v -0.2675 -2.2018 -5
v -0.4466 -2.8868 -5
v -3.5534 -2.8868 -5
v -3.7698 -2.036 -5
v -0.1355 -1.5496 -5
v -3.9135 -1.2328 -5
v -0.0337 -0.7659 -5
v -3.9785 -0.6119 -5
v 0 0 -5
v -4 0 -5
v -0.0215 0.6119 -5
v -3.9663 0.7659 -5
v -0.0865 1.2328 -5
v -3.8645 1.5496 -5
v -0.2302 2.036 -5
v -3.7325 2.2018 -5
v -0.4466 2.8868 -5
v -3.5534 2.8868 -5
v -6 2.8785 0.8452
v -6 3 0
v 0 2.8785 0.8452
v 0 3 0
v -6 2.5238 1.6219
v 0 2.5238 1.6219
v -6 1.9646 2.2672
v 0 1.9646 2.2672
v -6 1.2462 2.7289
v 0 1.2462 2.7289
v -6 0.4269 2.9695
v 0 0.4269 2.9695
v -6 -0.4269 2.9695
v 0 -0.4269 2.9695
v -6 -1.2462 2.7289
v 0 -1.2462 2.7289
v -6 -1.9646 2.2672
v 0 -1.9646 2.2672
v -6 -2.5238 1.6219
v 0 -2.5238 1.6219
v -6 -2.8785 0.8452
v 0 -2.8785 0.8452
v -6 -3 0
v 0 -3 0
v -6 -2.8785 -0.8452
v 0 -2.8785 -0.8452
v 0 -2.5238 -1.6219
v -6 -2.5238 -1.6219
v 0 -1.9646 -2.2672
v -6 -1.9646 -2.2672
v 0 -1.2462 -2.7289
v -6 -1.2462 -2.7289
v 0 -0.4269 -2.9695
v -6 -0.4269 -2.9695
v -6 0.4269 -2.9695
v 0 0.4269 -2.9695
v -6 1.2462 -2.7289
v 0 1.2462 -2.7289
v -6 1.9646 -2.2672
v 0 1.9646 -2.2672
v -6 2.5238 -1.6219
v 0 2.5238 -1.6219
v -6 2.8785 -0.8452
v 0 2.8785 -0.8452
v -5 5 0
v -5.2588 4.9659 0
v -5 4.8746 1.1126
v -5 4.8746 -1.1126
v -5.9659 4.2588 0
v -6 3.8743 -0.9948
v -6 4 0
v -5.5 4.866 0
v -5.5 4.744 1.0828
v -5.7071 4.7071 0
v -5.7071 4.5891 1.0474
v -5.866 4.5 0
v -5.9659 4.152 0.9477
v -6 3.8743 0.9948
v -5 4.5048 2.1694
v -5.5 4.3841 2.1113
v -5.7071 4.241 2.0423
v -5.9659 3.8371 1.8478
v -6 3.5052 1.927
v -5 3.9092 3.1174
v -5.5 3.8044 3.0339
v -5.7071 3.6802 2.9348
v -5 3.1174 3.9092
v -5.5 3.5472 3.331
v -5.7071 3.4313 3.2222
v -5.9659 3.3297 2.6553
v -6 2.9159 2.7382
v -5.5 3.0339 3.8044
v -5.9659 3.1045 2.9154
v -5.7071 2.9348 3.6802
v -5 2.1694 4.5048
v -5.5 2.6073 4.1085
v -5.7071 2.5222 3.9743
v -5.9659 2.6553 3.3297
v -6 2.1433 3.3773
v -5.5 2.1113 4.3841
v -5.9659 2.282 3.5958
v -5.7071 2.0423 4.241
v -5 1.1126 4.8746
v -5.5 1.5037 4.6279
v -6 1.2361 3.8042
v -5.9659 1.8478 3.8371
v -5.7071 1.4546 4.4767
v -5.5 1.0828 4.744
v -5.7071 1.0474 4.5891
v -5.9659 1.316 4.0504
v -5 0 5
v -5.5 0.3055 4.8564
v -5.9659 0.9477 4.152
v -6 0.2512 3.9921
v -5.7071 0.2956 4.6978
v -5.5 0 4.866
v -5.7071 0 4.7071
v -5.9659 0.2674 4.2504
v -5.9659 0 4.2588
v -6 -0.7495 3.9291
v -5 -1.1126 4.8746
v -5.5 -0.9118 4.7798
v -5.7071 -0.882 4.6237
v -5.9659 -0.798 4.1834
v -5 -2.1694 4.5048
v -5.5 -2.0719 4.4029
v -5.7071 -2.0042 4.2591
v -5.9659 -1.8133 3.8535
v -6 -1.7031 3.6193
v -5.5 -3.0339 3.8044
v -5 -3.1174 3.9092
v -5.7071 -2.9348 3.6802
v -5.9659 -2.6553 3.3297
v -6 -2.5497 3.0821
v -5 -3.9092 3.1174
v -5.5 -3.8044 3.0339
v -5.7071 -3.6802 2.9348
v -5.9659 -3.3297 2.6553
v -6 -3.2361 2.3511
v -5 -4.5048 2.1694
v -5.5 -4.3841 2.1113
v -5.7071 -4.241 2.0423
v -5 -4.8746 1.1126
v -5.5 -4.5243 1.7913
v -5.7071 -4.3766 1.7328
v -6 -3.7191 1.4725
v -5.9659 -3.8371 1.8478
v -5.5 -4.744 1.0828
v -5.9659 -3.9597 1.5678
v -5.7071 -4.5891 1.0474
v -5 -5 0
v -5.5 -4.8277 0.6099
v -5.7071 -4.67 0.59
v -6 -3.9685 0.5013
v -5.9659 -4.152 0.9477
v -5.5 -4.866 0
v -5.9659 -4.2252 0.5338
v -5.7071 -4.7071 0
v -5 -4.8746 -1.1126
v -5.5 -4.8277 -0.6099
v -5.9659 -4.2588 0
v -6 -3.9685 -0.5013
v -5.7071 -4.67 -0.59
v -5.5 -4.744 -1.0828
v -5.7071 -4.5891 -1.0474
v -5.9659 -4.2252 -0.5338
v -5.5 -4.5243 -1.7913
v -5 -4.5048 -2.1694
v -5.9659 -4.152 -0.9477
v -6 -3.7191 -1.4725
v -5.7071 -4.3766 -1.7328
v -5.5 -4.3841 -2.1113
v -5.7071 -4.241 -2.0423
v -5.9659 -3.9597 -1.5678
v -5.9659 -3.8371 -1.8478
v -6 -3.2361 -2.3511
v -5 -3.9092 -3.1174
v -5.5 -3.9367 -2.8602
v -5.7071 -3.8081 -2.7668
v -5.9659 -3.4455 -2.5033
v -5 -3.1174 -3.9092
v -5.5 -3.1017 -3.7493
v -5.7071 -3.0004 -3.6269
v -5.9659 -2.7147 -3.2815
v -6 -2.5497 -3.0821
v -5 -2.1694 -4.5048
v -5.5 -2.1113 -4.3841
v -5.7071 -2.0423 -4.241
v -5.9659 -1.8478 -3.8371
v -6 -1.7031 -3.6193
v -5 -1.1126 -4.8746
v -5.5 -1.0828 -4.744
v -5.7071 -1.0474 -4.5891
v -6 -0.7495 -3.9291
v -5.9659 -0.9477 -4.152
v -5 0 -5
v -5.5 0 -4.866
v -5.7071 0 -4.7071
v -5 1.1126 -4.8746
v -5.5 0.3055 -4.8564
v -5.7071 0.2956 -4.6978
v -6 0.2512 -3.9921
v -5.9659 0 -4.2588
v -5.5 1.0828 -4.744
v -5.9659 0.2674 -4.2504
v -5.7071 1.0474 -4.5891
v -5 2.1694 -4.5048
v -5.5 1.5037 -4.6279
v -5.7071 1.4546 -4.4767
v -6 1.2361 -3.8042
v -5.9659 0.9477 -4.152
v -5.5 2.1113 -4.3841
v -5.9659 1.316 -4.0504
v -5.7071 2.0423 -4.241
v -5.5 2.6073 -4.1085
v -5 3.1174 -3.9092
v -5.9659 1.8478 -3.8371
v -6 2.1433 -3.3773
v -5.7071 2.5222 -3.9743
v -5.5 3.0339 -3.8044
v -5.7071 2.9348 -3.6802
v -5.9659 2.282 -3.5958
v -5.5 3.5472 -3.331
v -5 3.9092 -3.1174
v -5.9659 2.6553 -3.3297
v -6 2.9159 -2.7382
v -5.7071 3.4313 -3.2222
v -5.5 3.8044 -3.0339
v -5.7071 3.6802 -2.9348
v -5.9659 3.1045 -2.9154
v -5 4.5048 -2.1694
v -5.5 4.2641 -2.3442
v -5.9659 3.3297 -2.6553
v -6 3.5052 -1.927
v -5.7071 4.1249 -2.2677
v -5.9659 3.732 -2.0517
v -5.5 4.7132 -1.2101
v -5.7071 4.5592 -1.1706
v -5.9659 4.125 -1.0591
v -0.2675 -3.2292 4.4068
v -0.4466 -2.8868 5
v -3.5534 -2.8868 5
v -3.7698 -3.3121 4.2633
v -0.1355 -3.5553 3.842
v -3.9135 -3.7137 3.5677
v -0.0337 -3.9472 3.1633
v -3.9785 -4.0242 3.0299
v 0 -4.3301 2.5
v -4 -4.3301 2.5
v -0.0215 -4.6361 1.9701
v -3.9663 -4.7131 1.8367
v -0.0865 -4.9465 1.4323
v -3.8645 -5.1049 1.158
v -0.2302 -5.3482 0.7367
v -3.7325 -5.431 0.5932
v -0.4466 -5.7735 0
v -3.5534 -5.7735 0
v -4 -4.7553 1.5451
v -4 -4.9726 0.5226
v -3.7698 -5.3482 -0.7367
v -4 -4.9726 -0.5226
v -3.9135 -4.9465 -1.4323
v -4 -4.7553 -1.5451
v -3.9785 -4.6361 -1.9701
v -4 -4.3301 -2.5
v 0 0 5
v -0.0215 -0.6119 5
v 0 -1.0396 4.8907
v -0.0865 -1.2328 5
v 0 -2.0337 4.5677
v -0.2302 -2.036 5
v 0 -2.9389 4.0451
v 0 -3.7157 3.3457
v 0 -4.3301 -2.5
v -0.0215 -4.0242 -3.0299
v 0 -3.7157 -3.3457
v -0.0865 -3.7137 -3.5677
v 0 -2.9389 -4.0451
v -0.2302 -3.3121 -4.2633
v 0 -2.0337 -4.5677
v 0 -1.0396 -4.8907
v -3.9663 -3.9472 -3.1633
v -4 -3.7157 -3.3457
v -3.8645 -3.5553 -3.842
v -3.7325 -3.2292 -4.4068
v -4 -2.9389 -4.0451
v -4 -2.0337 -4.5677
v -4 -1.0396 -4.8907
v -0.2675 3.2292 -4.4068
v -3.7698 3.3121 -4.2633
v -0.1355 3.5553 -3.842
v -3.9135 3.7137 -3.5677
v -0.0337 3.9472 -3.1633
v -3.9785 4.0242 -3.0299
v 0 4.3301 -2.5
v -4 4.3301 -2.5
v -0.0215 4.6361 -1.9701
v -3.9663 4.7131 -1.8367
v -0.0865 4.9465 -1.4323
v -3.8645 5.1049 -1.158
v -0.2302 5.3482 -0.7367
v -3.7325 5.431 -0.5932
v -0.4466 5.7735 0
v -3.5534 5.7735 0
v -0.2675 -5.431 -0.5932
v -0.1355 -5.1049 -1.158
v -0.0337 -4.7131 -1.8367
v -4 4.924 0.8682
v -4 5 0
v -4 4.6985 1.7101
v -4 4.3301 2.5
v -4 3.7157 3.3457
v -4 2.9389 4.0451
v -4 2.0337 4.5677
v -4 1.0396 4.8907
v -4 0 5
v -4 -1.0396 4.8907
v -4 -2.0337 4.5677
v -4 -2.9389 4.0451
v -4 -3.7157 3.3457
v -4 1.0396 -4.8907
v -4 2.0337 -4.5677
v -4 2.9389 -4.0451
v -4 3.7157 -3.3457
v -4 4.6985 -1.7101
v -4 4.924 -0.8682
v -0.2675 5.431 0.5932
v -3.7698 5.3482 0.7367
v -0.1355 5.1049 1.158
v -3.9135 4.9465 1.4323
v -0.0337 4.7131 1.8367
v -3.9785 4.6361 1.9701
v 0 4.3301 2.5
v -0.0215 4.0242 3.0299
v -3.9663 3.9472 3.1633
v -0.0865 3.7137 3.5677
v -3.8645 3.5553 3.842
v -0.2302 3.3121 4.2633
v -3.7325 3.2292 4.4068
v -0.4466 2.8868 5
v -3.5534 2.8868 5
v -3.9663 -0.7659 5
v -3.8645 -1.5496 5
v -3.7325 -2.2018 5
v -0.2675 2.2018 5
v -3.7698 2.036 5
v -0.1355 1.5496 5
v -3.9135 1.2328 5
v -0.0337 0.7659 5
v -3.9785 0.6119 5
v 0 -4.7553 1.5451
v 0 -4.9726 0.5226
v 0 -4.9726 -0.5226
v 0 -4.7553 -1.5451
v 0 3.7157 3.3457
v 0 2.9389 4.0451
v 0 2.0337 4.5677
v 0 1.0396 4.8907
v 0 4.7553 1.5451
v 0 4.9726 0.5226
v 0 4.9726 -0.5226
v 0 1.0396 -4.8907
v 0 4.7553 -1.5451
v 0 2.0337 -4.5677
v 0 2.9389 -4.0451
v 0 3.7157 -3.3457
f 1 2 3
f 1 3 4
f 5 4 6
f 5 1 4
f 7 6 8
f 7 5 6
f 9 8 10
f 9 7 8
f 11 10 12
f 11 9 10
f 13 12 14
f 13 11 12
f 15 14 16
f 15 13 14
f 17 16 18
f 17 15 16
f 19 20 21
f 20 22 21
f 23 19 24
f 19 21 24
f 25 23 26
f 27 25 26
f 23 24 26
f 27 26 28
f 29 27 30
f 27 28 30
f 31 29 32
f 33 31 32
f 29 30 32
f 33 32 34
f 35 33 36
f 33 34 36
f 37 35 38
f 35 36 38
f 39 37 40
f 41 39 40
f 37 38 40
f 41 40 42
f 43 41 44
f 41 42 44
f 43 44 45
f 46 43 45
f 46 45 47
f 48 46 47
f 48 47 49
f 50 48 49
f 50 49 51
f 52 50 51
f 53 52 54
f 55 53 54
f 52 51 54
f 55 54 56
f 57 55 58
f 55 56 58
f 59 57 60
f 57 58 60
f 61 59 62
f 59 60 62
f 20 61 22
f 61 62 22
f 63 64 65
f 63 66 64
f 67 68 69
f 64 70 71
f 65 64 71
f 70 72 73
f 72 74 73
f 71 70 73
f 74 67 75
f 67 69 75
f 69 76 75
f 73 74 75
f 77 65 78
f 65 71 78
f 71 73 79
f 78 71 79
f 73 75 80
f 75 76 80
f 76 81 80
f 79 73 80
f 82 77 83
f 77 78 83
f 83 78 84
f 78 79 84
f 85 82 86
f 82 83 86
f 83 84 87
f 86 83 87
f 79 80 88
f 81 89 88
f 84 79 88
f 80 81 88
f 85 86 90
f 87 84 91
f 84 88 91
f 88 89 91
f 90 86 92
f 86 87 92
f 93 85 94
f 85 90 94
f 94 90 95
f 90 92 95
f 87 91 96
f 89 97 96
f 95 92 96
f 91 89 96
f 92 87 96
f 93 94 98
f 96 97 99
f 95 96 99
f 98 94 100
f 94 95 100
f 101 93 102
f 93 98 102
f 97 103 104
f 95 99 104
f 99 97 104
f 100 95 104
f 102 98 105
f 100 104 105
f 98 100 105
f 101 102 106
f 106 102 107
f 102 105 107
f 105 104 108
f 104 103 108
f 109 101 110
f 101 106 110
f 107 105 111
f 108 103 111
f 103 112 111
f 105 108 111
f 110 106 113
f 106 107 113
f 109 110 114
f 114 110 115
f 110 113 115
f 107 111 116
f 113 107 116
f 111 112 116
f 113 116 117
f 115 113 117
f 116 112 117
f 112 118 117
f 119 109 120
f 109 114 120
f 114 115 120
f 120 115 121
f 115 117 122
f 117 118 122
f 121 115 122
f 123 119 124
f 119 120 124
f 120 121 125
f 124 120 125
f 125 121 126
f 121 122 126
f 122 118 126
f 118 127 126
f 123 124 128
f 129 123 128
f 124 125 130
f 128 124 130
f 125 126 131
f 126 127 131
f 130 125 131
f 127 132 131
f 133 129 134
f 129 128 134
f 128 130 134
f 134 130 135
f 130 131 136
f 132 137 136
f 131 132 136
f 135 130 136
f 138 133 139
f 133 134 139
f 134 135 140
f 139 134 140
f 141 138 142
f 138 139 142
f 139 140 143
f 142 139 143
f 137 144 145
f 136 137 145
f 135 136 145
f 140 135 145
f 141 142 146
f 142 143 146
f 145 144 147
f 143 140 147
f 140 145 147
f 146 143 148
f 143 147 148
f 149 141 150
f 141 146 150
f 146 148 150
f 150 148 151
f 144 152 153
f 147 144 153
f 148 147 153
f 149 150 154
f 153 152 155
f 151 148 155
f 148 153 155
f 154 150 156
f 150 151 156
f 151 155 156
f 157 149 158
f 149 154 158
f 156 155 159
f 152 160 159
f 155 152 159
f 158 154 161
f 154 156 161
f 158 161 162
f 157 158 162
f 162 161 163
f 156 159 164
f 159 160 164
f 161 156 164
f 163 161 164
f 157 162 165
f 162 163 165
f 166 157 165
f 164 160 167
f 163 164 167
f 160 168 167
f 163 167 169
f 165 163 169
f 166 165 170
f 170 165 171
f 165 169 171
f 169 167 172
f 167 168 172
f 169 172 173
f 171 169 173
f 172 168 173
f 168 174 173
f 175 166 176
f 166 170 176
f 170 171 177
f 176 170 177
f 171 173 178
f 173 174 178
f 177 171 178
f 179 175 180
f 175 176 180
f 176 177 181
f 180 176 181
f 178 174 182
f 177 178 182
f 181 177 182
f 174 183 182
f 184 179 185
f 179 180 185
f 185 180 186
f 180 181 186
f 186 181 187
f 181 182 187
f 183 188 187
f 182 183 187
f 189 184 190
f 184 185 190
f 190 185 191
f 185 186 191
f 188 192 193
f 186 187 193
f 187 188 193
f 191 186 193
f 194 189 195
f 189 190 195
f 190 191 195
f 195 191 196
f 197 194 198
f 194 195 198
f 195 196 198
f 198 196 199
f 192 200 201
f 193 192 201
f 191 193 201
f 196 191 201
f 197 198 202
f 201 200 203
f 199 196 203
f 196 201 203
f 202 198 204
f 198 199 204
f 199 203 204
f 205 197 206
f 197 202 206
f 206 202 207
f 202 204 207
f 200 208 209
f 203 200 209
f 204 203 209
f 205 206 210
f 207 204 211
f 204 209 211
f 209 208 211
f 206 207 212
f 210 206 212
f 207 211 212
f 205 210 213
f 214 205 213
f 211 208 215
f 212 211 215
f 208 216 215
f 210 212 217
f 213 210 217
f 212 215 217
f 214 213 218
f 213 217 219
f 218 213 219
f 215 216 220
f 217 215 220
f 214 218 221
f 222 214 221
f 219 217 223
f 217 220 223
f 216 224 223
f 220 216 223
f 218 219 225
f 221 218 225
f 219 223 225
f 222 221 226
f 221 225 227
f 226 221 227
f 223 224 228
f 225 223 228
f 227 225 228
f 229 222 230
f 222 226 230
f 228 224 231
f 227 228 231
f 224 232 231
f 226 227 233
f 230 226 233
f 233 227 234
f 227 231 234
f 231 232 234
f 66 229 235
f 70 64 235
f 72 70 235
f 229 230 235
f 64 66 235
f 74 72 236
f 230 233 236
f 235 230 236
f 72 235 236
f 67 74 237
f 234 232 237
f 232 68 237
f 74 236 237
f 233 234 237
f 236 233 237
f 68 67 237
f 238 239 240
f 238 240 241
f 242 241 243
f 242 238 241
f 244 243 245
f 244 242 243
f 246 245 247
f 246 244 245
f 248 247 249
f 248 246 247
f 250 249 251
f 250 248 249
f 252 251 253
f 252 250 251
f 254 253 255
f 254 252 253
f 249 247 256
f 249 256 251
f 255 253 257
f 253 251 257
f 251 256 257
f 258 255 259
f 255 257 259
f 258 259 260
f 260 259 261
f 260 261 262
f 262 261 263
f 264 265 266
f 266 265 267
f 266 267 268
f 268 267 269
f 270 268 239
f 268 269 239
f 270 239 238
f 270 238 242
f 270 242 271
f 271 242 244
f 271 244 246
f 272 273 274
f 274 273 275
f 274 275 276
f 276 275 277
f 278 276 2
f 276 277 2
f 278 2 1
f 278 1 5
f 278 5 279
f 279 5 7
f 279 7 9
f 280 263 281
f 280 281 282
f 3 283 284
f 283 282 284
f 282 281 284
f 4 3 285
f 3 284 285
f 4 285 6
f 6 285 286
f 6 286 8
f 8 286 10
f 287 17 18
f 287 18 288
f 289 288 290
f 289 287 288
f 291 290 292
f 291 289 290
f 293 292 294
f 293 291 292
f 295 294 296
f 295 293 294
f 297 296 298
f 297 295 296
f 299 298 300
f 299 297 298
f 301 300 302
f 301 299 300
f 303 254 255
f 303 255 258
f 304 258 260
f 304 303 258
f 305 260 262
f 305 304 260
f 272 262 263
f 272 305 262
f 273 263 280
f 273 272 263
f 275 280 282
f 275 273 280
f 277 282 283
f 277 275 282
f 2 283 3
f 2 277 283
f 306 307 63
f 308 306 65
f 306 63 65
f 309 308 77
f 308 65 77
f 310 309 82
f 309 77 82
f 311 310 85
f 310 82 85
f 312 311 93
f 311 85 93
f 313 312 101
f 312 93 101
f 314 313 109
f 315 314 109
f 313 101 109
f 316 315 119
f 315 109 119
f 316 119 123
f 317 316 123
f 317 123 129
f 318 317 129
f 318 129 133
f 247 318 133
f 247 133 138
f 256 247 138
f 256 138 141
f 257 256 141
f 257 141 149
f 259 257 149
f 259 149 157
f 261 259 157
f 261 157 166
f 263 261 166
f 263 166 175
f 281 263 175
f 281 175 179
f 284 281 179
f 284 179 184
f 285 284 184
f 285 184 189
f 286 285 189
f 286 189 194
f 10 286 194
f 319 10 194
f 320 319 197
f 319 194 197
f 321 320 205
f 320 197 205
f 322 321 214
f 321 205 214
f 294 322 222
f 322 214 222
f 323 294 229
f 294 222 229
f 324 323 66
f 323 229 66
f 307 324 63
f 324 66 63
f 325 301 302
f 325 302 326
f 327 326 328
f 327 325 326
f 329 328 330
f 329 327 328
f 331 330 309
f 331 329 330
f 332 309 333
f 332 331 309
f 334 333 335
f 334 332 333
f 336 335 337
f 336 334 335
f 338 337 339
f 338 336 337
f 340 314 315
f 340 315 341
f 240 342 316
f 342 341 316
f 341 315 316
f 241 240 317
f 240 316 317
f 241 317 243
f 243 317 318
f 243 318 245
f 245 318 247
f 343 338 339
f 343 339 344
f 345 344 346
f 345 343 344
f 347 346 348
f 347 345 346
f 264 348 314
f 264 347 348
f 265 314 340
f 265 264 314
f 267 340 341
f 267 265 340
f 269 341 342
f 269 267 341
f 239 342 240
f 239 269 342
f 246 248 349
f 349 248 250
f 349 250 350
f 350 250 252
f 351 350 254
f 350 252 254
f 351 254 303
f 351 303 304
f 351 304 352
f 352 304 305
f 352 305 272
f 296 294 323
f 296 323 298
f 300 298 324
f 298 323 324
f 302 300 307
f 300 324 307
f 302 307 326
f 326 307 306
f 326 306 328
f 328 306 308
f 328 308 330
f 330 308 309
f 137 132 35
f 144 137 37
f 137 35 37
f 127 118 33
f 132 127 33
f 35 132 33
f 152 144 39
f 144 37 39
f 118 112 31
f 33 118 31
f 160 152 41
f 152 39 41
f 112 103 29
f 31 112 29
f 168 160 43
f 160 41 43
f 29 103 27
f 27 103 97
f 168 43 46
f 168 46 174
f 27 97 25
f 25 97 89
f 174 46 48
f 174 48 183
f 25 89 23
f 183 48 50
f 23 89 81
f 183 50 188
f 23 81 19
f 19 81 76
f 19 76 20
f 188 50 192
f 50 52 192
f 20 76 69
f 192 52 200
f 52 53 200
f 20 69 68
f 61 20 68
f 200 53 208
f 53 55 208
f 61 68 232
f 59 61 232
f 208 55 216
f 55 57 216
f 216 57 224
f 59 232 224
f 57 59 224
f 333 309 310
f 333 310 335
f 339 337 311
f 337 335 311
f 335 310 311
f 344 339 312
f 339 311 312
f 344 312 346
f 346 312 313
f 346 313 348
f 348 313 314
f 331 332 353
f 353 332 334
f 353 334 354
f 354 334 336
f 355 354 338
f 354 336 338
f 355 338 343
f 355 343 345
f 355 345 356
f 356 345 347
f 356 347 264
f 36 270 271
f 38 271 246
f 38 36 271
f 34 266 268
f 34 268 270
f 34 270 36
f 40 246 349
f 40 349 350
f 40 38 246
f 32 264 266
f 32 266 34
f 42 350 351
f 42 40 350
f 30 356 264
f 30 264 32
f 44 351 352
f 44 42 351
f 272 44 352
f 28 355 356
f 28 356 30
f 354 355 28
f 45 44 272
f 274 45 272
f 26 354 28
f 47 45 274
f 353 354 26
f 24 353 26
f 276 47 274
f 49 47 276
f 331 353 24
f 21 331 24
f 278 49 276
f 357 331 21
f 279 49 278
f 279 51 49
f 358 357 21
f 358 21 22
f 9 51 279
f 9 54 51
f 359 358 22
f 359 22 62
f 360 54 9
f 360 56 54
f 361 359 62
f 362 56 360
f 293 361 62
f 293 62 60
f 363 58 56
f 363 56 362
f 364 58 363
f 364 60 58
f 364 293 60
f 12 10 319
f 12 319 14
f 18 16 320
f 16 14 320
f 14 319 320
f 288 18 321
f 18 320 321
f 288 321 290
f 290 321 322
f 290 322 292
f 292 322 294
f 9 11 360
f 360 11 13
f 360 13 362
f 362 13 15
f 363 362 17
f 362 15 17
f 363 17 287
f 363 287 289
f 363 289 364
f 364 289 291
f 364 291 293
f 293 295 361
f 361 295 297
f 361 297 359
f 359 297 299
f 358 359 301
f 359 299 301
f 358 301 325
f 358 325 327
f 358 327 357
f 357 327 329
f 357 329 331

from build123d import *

# Parameters (mm, degrees)
BOSS_EXTRUDE1_DEPTH = 6
SKETCH2_W           = 6
SKETCH2_H           = 3


with BuildPart() as part:
    # Sketch1 → Boss-Extrude1 (new body)
    with BuildSketch(Plane(origin=(0, 0, 0), x_dir=(0, 0, -1), z_dir=(1, 0, 0))):
        Polygon((0, 5.773502692), (-5, 2.886751346), (-5, -2.886751346), (0, -5.773502692), (5, -2.886751346), (5, 2.886751346), align=None)
    extrude(amount=-BOSS_EXTRUDE1_DEPTH)

    # Sketch2 → Cut-Revolve4 (revolve, cut)
    with BuildSketch(Plane.XY):
        Polygon((0, 5), (-0.446581987, 5.773502692), (0, 5.773502692), align=None)
        with BuildLine():
            Line((-3.553418013, 5.773502692), (-4, 5))
            Line((-4, 5), (-5, 5))
            ThreePointArc((-5, 5), (-5.707106781, 4.707106781), (-6, 4))
            Line((-6, 4), (-6.773502692, 4))
            Line((-6.773502692, 4), (-6.773502692, 5.773502692))
            Line((-6.773502692, 5.773502692), (-3.553418013, 5.773502692))
        make_face()
        with Locations((-3, 1.5)):
            Rectangle(SKETCH2_W, SKETCH2_H)
    revolve(axis=Axis((-8.121993413, 0, 0), (1, 0, 0)), mode=Mode.SUBTRACT)


solid = part.part
